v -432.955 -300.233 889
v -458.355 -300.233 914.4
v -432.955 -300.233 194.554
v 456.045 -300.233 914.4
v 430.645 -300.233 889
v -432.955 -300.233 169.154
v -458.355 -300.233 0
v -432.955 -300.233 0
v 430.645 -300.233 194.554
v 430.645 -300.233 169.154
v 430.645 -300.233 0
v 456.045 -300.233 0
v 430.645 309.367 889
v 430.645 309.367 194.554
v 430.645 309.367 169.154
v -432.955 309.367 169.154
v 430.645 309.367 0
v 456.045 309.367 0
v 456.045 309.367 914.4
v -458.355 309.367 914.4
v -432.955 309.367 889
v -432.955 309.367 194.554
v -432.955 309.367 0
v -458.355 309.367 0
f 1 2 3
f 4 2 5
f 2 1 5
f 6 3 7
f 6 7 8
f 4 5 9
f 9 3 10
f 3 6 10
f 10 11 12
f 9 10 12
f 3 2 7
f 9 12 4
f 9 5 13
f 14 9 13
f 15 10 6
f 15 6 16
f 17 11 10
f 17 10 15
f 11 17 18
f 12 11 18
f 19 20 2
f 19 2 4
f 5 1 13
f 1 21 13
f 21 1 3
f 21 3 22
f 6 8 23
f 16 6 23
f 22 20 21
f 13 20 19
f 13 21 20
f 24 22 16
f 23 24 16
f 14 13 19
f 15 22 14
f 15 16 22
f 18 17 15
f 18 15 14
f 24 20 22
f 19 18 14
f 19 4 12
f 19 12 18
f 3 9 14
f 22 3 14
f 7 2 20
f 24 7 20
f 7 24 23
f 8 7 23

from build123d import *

# Parameters (mm, degrees)
F0_W     = 914.4
F0_H     = 609.6
F1_DEPTH = 914.4
F2_T     = -25.4
F3_W     = 609.6
F3_H     = 25.4
F4_DEPTH = 863.6


with BuildPart() as f1:
    # F0 (on Top) → F1 (new body)
    with BuildSketch(Plane.XY):
        with Locations((-1.154758, 4.566898)):
            Rectangle(F0_W, F0_H)
    extrude(amount=F1_DEPTH)

    # F2
    f2_openings = [f1.faces().sort_by_distance(p)[0] for p in [
        (-1.154758, 4.566898, 0),
        (-1.154758, -300.233102, 457.2),
        (-1.154758, 309.366898, 457.2),
    ]]
    offset(amount=F2_T, openings=f2_openings)

    # F3 (on face) → F4 (join, through all)
    with BuildSketch(Plane.YZ.offset(-432.954758)):
        with Locations((4.566898, 181.854316)):
            Rectangle(F3_W, F3_H)
    extrude(amount=F4_DEPTH)


solid = f1.part
